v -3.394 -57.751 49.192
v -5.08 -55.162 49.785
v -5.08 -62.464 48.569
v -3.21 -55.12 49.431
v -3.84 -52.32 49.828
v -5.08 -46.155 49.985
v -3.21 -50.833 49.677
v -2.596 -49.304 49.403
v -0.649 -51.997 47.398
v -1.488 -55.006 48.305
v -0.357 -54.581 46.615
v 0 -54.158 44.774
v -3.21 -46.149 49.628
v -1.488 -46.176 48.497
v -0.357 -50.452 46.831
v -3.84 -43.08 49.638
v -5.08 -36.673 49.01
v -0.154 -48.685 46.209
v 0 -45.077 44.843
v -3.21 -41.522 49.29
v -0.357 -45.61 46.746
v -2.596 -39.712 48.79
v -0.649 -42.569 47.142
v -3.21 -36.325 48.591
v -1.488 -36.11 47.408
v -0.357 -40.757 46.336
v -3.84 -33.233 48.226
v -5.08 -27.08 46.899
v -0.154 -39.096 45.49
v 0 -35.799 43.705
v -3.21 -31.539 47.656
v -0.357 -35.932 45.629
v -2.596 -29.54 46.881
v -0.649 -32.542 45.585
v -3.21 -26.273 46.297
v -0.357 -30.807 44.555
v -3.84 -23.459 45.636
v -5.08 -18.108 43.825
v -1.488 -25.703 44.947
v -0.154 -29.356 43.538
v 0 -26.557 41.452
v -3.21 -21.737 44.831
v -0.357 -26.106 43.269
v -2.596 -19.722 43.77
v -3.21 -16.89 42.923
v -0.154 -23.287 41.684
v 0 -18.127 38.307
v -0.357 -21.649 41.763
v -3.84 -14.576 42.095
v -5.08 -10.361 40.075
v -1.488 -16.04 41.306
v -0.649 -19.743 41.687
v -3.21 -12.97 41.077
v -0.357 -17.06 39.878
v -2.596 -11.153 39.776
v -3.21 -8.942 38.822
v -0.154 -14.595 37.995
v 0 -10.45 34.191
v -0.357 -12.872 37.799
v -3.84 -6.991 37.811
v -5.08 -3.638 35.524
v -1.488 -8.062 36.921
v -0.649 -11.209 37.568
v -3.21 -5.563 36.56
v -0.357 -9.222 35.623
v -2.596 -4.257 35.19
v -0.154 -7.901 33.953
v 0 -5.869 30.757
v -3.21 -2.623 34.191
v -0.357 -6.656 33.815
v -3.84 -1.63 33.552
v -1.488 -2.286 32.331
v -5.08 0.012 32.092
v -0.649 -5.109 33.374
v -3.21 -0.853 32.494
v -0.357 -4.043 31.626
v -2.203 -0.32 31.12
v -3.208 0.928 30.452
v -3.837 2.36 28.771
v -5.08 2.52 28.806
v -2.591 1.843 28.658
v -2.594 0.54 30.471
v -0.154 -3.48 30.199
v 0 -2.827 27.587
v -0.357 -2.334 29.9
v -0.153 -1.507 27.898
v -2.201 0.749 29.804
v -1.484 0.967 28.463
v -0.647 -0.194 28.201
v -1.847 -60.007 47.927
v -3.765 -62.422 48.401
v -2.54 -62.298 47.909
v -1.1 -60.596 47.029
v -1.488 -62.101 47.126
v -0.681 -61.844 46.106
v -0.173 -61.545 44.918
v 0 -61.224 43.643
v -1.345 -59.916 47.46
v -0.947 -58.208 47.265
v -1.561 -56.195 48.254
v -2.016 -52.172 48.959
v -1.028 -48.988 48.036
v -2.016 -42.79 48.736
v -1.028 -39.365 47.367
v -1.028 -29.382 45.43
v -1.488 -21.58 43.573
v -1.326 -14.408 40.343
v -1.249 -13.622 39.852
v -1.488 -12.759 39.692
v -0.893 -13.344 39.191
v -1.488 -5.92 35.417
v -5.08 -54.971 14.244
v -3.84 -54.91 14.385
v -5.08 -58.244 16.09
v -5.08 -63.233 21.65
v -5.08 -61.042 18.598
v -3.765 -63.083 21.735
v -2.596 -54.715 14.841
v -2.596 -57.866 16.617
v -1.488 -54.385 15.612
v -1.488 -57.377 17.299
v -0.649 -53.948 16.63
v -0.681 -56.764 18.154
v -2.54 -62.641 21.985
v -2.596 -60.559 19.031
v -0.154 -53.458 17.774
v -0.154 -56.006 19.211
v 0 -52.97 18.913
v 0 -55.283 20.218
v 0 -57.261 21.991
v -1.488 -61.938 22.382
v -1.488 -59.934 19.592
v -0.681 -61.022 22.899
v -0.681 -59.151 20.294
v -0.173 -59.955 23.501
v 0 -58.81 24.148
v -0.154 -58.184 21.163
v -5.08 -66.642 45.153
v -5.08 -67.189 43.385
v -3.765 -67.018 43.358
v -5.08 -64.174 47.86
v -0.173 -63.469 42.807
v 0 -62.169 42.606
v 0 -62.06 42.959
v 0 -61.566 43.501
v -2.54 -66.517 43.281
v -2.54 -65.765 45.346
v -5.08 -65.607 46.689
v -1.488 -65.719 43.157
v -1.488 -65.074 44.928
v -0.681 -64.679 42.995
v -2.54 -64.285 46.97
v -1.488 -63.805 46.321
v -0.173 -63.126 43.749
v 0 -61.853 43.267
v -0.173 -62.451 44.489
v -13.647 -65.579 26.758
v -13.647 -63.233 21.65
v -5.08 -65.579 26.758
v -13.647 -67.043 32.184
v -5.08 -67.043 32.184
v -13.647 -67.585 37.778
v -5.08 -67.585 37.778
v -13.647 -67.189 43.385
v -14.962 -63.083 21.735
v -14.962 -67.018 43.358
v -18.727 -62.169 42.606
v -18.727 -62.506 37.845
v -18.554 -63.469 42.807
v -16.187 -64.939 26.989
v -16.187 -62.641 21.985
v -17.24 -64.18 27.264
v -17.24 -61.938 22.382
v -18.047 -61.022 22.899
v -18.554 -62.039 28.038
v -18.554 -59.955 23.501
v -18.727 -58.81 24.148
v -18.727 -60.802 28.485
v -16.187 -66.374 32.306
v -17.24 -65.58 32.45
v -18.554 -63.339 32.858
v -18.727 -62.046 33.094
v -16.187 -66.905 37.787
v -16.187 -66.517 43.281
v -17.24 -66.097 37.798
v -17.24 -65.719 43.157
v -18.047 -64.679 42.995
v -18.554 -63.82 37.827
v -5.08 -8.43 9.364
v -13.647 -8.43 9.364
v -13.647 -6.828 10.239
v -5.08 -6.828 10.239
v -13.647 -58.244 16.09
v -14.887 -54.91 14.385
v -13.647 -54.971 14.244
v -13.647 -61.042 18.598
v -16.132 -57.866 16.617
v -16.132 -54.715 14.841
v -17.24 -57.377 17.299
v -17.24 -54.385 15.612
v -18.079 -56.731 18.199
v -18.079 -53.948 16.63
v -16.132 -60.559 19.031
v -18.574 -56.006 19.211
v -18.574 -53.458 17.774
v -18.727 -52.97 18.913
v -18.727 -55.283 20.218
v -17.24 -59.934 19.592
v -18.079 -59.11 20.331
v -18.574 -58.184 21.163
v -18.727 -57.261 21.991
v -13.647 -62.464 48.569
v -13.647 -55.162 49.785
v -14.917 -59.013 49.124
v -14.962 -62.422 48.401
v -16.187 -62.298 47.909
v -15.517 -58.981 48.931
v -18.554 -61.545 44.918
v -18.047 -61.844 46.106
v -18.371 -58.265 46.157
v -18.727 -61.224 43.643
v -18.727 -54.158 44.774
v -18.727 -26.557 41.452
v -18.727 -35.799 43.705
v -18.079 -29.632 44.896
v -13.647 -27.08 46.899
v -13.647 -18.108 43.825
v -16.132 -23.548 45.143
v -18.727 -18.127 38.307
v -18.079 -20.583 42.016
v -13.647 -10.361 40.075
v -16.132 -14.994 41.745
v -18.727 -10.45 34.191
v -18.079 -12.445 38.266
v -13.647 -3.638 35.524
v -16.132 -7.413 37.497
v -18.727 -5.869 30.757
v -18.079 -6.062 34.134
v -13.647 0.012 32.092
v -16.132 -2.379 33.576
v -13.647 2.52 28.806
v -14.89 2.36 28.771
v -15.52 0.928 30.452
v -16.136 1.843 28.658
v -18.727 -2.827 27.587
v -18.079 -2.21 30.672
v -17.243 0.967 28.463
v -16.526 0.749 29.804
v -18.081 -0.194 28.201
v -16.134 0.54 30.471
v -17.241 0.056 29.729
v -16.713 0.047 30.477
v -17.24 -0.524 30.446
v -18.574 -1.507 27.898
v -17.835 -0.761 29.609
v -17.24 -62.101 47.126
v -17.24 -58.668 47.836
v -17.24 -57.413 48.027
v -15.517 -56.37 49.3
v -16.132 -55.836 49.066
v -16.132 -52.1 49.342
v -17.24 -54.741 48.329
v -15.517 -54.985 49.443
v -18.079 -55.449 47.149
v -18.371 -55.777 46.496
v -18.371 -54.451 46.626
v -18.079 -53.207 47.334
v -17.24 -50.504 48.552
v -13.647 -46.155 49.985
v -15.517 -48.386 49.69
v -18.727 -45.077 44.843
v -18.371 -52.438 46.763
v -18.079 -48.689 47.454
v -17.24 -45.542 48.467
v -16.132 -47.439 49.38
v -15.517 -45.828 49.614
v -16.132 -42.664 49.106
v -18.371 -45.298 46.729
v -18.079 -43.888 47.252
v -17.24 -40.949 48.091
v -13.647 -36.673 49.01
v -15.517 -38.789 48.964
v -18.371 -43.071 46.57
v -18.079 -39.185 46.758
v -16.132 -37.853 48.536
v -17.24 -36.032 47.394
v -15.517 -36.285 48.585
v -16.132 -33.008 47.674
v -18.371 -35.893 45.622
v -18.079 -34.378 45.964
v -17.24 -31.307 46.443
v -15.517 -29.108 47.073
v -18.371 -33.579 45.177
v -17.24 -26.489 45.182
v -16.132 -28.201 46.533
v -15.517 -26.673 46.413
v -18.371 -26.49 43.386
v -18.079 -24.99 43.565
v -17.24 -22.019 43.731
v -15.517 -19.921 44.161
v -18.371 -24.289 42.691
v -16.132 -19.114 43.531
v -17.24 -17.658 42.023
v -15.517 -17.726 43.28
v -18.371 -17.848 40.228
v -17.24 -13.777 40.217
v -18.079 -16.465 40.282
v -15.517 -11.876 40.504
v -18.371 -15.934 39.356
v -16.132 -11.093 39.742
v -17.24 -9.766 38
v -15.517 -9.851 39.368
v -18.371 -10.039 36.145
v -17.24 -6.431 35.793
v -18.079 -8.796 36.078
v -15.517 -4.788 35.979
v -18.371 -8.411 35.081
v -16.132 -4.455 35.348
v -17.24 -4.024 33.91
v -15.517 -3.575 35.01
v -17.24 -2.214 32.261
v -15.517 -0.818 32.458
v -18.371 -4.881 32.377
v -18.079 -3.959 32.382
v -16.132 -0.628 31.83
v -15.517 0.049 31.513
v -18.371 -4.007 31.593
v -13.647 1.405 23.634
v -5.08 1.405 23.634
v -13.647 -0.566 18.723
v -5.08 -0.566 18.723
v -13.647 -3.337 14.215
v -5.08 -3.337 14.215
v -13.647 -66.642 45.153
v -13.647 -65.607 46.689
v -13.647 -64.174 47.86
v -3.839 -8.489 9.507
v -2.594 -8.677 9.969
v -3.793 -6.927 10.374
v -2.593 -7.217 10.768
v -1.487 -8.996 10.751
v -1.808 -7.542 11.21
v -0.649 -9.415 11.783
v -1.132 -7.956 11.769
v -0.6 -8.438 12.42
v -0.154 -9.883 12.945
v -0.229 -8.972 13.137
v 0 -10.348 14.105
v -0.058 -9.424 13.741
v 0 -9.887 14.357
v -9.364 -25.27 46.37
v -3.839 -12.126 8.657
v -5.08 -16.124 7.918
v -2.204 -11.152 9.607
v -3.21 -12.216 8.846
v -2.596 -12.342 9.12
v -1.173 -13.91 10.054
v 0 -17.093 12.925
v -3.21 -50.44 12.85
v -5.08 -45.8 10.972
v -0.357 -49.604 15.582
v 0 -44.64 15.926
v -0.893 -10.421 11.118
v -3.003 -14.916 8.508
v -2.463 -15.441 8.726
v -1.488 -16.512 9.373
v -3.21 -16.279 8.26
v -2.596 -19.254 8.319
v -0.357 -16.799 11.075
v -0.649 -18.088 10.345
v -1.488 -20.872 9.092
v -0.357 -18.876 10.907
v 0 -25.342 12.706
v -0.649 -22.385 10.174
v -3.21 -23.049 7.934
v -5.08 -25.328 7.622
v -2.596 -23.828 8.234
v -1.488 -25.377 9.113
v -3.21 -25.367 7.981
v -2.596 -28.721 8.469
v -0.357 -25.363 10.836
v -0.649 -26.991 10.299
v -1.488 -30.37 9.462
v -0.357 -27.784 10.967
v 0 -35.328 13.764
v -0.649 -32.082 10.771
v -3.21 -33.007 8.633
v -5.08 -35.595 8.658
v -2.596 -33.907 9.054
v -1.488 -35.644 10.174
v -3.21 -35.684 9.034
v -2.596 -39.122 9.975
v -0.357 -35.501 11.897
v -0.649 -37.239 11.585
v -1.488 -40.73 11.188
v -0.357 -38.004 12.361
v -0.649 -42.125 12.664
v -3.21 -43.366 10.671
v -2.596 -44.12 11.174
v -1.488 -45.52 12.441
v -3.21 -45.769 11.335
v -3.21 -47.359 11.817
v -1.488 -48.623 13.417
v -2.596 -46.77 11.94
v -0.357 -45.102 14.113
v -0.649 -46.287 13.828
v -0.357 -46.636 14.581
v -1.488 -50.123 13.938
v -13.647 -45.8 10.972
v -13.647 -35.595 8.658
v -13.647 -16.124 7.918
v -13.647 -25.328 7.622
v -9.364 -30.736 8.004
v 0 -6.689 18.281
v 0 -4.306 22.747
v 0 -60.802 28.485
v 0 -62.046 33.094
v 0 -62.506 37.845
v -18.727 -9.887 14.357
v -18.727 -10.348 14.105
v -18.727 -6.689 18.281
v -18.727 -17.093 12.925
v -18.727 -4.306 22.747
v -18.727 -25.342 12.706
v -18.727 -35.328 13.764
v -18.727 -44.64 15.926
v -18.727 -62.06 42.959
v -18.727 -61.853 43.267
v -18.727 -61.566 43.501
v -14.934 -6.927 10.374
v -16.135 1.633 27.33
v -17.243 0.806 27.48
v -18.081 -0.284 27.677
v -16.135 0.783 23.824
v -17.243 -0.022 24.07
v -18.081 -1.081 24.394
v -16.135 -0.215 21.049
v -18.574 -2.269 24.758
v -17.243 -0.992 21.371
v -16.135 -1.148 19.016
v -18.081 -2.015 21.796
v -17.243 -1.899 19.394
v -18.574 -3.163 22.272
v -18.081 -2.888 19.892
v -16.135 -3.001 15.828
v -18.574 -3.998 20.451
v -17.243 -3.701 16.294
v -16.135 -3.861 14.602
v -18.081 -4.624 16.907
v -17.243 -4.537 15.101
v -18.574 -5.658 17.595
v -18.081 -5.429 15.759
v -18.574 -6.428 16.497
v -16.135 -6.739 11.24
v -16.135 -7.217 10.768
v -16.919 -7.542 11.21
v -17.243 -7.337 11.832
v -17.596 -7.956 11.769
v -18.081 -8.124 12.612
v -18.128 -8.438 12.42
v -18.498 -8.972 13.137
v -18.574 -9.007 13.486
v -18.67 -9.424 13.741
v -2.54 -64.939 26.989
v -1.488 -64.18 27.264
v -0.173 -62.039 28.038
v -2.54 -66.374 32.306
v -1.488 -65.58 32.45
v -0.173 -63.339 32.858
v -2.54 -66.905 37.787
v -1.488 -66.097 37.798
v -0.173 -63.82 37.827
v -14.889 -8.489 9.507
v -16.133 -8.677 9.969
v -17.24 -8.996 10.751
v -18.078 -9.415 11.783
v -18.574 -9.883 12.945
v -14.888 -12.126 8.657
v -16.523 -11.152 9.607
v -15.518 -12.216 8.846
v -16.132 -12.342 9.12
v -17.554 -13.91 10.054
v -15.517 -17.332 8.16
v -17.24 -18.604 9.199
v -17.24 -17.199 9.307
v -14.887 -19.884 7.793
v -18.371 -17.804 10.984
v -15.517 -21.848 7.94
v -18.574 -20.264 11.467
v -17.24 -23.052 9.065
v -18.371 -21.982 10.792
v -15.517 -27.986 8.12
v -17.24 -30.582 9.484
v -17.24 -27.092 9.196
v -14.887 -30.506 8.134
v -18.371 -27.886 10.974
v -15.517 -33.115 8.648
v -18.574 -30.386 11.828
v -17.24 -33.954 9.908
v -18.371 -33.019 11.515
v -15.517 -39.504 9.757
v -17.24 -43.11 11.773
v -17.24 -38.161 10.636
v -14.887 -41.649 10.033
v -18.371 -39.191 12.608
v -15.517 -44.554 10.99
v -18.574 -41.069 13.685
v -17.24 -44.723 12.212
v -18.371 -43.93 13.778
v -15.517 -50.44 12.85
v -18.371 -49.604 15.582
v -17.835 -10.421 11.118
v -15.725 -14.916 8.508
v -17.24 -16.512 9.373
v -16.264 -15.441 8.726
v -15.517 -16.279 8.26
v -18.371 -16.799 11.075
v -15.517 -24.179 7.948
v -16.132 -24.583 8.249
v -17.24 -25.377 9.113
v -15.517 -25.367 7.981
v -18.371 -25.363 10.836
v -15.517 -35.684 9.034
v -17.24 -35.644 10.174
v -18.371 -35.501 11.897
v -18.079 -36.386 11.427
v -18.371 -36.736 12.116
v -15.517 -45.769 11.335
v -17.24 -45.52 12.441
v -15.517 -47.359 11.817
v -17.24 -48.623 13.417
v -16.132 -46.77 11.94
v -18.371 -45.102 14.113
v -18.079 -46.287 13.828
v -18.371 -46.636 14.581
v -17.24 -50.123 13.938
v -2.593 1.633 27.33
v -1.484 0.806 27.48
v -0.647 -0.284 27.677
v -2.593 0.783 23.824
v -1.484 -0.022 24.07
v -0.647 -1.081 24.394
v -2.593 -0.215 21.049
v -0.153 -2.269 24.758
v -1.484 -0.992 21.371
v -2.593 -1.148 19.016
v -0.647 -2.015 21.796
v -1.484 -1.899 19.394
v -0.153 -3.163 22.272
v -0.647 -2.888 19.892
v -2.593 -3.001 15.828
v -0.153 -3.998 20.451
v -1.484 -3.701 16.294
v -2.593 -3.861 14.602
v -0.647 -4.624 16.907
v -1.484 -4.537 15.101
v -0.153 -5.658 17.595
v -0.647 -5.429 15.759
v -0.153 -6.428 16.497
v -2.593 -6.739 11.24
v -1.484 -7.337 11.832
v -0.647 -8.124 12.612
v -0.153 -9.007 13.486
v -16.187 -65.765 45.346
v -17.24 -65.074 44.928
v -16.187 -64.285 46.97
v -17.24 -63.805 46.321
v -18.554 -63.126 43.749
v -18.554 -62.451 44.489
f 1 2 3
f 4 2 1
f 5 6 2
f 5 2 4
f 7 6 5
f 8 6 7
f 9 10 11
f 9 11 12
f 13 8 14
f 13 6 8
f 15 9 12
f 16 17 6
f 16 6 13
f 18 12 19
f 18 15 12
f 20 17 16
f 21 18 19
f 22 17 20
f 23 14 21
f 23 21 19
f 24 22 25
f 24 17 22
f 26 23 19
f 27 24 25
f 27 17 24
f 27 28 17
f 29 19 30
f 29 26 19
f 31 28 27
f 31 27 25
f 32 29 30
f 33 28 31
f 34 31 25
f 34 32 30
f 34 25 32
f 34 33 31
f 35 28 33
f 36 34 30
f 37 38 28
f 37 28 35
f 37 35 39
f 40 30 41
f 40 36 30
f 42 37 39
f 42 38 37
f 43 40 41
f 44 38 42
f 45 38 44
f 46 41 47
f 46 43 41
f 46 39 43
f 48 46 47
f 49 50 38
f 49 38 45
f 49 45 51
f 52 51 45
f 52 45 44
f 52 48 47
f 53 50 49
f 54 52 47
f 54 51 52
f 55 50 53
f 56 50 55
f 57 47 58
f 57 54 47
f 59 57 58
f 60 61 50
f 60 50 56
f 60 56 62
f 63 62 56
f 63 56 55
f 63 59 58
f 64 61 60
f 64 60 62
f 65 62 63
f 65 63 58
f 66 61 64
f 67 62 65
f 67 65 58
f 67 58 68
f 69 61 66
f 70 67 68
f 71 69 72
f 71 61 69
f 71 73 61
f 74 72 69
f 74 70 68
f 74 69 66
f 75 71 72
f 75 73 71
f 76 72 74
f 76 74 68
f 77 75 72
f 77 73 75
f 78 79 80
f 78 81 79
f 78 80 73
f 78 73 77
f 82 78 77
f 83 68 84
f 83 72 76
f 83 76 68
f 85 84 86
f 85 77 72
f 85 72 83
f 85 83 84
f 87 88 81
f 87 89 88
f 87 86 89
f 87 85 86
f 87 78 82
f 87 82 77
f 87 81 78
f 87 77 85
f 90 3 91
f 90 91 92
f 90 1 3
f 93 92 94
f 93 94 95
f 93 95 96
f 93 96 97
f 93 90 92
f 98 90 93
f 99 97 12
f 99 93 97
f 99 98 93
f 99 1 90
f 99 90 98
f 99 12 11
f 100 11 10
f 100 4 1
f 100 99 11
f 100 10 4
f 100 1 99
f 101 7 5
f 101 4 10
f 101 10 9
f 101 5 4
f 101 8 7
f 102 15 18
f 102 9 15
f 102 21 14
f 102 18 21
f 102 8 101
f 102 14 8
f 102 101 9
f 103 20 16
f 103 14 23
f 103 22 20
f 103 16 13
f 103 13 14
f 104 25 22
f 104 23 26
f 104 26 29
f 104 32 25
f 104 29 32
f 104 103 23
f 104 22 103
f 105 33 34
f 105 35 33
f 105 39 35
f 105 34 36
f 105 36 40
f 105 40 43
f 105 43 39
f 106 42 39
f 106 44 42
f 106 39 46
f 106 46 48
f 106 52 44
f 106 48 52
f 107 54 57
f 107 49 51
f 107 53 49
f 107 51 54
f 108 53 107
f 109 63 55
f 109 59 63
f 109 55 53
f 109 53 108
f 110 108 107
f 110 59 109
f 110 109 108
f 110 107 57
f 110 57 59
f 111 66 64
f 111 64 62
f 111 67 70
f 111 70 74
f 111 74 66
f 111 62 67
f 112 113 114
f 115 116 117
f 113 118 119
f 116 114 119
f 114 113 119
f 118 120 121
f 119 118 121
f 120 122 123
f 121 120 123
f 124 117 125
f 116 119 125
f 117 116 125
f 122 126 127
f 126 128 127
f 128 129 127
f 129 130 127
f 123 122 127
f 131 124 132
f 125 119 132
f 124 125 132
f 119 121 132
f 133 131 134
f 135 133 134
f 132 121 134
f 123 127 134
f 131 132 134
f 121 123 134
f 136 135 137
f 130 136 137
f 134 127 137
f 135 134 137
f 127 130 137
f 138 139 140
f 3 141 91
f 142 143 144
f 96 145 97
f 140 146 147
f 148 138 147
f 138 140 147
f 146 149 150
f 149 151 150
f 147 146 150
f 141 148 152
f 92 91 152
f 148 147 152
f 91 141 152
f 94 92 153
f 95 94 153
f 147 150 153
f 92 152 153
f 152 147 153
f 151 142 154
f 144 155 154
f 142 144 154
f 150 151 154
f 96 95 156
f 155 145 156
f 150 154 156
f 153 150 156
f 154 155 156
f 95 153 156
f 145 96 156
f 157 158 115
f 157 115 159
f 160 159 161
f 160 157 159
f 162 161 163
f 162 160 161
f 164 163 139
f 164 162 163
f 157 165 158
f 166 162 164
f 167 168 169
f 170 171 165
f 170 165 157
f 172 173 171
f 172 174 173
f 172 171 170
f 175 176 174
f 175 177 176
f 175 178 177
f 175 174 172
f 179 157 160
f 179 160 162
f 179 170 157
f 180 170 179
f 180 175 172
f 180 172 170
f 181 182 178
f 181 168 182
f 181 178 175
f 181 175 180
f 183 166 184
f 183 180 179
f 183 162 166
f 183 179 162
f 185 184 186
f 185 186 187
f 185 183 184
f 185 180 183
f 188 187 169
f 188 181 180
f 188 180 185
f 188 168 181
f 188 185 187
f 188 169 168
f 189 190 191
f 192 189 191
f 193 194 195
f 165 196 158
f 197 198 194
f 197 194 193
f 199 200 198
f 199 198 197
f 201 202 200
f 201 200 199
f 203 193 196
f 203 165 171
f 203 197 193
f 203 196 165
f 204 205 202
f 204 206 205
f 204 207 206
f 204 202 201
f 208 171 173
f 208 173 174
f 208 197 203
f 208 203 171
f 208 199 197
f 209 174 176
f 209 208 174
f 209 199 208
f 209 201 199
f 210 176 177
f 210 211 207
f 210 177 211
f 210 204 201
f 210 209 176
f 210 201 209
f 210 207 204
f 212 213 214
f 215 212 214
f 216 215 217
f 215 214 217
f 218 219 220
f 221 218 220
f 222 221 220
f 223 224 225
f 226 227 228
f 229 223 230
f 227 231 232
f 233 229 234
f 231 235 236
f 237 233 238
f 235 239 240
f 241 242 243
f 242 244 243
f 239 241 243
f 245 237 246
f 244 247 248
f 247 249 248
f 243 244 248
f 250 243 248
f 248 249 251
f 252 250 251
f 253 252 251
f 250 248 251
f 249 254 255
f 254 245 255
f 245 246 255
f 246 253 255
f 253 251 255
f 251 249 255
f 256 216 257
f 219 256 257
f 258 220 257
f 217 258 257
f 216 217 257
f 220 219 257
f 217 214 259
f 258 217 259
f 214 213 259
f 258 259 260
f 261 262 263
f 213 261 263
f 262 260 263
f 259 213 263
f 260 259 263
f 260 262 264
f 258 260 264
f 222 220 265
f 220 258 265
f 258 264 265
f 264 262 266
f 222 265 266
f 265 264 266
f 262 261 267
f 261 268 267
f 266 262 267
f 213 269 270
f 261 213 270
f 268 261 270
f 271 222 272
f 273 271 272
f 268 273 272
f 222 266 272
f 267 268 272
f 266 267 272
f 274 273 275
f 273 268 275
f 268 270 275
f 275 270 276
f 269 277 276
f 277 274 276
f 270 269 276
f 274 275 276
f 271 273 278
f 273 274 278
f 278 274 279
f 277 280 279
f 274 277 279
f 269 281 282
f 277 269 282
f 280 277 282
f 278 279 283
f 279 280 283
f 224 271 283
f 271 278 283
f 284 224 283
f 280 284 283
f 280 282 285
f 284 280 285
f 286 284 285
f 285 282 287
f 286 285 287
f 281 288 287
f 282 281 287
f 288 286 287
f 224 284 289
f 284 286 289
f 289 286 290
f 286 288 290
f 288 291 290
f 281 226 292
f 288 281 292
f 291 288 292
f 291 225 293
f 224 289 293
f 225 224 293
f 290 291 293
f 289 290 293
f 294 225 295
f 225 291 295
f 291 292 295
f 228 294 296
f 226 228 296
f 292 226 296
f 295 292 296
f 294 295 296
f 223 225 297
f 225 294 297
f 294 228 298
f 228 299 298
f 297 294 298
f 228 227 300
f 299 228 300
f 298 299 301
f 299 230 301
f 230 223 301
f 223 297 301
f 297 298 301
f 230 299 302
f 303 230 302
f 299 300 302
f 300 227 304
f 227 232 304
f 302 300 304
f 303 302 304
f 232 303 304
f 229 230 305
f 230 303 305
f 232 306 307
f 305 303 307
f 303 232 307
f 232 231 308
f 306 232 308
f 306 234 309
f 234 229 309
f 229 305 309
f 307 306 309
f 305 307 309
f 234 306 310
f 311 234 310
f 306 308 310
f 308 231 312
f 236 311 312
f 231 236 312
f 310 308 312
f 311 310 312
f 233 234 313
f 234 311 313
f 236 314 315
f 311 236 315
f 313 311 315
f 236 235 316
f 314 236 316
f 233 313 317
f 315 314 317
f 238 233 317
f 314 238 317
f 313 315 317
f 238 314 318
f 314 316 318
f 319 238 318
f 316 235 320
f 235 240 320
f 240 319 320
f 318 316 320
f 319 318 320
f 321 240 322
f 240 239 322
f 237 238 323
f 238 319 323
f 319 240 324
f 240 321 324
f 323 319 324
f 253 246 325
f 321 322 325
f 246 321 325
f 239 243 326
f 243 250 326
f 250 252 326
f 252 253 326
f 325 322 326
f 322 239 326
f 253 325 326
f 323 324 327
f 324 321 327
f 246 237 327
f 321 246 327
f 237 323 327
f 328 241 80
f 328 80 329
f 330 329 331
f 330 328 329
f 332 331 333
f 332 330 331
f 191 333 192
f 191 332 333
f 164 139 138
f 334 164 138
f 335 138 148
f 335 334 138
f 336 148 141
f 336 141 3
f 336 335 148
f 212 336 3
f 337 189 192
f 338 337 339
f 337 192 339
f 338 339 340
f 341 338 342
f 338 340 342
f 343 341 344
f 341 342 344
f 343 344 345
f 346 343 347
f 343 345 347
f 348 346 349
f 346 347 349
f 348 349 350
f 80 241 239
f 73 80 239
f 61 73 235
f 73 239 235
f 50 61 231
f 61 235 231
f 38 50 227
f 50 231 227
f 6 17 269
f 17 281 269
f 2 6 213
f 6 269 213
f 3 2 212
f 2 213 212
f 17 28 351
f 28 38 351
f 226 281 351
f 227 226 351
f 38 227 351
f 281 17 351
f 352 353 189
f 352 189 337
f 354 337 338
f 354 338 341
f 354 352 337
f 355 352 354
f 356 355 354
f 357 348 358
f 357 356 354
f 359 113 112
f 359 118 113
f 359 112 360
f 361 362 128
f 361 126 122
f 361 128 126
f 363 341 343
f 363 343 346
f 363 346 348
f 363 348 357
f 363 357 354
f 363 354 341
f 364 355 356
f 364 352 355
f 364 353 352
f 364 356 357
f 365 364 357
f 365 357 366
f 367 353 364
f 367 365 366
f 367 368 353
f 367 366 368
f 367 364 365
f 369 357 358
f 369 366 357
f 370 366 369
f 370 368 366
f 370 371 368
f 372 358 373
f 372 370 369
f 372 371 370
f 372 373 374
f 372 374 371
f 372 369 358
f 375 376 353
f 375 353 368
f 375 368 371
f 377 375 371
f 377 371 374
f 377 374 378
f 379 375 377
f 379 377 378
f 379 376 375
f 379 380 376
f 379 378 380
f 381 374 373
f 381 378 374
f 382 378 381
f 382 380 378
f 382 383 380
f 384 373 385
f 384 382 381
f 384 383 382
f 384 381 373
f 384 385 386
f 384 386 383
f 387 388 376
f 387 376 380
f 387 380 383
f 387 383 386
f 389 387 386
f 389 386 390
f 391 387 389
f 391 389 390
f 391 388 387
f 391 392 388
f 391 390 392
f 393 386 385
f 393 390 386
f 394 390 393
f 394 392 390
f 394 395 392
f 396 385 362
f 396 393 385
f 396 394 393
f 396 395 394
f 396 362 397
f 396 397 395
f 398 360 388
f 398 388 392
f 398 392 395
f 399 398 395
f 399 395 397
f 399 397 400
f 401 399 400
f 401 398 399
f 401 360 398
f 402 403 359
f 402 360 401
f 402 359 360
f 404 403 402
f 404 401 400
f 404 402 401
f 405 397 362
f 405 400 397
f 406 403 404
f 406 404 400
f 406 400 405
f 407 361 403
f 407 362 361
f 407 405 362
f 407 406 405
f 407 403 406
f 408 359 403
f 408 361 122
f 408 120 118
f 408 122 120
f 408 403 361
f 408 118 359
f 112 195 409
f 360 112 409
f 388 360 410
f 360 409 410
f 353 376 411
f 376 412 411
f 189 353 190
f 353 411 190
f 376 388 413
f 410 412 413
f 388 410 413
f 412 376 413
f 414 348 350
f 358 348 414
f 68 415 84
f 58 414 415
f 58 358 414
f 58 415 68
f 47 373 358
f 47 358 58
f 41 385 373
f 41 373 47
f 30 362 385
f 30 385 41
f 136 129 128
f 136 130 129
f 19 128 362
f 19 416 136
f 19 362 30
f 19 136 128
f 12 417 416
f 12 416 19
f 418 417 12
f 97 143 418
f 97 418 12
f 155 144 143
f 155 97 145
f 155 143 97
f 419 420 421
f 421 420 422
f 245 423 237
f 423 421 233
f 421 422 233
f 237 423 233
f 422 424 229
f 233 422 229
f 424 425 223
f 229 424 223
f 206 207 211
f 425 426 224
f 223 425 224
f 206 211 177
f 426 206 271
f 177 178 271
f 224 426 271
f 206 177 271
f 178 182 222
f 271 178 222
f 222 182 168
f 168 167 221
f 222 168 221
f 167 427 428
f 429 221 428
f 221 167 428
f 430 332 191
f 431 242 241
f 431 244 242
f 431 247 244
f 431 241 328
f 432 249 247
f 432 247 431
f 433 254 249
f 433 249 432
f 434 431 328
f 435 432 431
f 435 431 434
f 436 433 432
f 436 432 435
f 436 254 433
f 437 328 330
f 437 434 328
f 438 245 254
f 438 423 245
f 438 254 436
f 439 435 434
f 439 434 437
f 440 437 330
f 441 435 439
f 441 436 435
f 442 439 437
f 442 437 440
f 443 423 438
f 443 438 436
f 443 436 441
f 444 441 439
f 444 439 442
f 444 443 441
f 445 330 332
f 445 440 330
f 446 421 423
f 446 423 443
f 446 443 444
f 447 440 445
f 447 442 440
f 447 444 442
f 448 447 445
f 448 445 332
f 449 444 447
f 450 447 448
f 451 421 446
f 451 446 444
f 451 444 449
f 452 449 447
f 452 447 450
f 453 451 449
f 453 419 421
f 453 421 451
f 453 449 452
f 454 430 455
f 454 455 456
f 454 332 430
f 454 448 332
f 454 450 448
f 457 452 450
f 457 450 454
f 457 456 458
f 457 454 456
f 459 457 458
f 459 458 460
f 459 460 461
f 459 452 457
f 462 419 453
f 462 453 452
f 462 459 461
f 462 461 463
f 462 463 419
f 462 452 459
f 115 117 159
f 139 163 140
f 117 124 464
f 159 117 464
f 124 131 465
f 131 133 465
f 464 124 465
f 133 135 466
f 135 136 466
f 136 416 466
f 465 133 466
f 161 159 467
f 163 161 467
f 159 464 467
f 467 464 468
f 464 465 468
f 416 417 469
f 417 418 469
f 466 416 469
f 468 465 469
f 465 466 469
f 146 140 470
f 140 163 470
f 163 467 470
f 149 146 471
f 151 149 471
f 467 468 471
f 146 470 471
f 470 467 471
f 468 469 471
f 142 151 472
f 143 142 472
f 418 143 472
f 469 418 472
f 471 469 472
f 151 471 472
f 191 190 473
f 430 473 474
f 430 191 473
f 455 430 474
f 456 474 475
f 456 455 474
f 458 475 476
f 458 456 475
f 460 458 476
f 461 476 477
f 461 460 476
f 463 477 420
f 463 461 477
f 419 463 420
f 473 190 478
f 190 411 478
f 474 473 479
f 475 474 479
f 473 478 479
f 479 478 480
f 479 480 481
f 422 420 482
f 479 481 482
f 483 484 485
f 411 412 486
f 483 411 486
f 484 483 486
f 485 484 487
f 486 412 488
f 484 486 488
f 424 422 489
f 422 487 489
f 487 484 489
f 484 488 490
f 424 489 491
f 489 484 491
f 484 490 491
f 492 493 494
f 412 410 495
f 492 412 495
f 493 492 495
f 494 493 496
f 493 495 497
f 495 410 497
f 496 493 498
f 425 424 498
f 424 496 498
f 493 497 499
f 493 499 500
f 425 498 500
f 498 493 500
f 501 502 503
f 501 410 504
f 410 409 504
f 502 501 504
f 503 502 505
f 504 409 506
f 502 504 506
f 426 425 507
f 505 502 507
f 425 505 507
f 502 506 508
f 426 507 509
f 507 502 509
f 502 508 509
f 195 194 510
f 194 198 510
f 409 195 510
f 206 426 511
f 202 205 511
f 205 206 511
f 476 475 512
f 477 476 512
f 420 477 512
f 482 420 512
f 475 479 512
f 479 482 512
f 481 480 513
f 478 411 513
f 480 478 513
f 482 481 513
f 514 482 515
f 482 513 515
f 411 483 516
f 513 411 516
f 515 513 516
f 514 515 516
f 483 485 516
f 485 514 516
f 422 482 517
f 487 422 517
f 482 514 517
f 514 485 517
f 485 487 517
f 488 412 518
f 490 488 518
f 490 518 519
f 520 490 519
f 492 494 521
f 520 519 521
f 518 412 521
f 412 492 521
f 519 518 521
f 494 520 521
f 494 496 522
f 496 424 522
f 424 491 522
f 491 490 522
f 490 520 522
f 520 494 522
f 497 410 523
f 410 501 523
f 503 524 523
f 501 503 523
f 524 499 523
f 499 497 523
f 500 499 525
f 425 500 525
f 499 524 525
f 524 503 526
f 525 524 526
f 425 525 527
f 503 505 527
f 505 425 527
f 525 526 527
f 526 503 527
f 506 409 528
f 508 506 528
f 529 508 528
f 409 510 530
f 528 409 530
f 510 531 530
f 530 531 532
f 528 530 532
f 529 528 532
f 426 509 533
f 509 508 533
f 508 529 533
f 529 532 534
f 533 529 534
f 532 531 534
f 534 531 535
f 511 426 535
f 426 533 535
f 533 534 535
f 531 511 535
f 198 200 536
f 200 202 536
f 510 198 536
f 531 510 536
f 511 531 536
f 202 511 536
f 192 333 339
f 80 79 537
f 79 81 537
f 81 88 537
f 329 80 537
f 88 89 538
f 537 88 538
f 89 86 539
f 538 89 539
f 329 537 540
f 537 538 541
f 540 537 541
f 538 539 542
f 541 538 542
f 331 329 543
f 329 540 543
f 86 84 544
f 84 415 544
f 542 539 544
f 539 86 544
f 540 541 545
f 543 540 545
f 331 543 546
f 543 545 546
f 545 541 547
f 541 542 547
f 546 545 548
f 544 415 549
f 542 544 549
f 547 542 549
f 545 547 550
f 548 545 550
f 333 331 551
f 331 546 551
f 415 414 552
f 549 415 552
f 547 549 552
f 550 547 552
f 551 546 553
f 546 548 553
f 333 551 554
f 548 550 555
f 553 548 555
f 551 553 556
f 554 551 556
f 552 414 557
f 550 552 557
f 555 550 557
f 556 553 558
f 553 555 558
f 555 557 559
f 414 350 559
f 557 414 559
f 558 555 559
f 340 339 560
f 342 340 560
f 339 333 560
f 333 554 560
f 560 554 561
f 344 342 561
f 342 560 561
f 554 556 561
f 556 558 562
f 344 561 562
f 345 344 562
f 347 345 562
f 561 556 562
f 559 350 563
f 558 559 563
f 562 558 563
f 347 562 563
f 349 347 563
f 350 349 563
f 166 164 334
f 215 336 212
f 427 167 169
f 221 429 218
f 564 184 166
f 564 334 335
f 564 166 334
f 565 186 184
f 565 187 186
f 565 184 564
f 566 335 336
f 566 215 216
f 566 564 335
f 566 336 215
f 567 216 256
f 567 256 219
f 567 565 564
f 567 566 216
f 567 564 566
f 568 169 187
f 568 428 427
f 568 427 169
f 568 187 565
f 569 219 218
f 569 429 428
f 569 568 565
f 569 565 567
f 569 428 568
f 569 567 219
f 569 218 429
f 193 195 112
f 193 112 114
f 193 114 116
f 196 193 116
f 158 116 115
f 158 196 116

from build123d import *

# Parameters (mm, degrees)
F3_R = 5.08


with BuildPart() as f2:
    # F2: sweep along a path in F1
    with BuildLine(Plane.XZ) as f2_path:
        Line((-18.7538489699, 37.0099879801), (-37.481315434, 37.0099879801))
    # F0 (on Right) → F2 (sweep)
    with BuildSketch(Plane.YZ):
        with BuildLine():
            ThreePointArc((-63.2333904502, 21.6500088574), (-59.7109744357, 17.267735227), (-54.9707940163, 14.2440906808))
            add(Edge.make_bspline(
                [(-54.9707940163, 14.2440906808), (-29.557007786, 3.354277996), (-8.4298012229, 9.3640714915)],
                knots=[4.3330950452, 4.3330950452, 4.3330950452, 5.560977455, 5.560977455, 5.560977455], degree=2, weights=[1, 0.8173838698, 1]))
            Line((-8.4298012229, 9.3640714915), (-6.8284584686, 10.2392208894))
            ThreePointArc((-6.8284584686, 10.2392208894), (-0.5664539631, 18.7231469313), (2.5196485221, 28.8060866296))
            add(Edge.make_bspline(
                [(2.5196485221, 28.8060866296), (-16.9083238195, 60.0320255806), (-62.463944192, 48.5690009646)],
                knots=[0.4350349648, 0.4350349648, 0.4350349648, 2.3821123688, 2.3821123688, 2.3821123688], degree=2, weights=[1, 0.5623769731, 1]))
            ThreePointArc((-62.463944192, 48.5690009646), (-65.6073437062, 46.688684411), (-67.1892597454, 43.38503605))
            ThreePointArc((-67.1892597454, 43.38503605), (-67.0434822848, 32.1840618928), (-63.2333904502, 21.6500088574))
        make_face()
    sweep(path=f2_path.line)

    # F3
    f3_edges = [f2.edges().sort_by_distance(p)[0] for p in [
        (-18.727466, -67.043482, 32.184062),
        (-18.727466, -59.710974, 17.267735),
        (-18.727466, -32.047448, 8.151815),
        (-18.727466, -7.62913, 9.801646),
        (-18.727466, -0.566454, 18.723147),
        (-18.727466, -27.276683, 46.954007),
        (-18.727466, -65.607344, 46.688684),
        (0, -67.043482, 32.184062),
        (0, -59.710974, 17.267735),
        (0, -30.736335, 8.00371),
        (0, -7.62913, 9.801646),
        (0, -0.566454, 18.723147),
        (0, -25.26983, 46.370482),
        (0, -65.607344, 46.688684),
    ]]
    fillet(f3_edges, radius=F3_R)


solid = f2.part
